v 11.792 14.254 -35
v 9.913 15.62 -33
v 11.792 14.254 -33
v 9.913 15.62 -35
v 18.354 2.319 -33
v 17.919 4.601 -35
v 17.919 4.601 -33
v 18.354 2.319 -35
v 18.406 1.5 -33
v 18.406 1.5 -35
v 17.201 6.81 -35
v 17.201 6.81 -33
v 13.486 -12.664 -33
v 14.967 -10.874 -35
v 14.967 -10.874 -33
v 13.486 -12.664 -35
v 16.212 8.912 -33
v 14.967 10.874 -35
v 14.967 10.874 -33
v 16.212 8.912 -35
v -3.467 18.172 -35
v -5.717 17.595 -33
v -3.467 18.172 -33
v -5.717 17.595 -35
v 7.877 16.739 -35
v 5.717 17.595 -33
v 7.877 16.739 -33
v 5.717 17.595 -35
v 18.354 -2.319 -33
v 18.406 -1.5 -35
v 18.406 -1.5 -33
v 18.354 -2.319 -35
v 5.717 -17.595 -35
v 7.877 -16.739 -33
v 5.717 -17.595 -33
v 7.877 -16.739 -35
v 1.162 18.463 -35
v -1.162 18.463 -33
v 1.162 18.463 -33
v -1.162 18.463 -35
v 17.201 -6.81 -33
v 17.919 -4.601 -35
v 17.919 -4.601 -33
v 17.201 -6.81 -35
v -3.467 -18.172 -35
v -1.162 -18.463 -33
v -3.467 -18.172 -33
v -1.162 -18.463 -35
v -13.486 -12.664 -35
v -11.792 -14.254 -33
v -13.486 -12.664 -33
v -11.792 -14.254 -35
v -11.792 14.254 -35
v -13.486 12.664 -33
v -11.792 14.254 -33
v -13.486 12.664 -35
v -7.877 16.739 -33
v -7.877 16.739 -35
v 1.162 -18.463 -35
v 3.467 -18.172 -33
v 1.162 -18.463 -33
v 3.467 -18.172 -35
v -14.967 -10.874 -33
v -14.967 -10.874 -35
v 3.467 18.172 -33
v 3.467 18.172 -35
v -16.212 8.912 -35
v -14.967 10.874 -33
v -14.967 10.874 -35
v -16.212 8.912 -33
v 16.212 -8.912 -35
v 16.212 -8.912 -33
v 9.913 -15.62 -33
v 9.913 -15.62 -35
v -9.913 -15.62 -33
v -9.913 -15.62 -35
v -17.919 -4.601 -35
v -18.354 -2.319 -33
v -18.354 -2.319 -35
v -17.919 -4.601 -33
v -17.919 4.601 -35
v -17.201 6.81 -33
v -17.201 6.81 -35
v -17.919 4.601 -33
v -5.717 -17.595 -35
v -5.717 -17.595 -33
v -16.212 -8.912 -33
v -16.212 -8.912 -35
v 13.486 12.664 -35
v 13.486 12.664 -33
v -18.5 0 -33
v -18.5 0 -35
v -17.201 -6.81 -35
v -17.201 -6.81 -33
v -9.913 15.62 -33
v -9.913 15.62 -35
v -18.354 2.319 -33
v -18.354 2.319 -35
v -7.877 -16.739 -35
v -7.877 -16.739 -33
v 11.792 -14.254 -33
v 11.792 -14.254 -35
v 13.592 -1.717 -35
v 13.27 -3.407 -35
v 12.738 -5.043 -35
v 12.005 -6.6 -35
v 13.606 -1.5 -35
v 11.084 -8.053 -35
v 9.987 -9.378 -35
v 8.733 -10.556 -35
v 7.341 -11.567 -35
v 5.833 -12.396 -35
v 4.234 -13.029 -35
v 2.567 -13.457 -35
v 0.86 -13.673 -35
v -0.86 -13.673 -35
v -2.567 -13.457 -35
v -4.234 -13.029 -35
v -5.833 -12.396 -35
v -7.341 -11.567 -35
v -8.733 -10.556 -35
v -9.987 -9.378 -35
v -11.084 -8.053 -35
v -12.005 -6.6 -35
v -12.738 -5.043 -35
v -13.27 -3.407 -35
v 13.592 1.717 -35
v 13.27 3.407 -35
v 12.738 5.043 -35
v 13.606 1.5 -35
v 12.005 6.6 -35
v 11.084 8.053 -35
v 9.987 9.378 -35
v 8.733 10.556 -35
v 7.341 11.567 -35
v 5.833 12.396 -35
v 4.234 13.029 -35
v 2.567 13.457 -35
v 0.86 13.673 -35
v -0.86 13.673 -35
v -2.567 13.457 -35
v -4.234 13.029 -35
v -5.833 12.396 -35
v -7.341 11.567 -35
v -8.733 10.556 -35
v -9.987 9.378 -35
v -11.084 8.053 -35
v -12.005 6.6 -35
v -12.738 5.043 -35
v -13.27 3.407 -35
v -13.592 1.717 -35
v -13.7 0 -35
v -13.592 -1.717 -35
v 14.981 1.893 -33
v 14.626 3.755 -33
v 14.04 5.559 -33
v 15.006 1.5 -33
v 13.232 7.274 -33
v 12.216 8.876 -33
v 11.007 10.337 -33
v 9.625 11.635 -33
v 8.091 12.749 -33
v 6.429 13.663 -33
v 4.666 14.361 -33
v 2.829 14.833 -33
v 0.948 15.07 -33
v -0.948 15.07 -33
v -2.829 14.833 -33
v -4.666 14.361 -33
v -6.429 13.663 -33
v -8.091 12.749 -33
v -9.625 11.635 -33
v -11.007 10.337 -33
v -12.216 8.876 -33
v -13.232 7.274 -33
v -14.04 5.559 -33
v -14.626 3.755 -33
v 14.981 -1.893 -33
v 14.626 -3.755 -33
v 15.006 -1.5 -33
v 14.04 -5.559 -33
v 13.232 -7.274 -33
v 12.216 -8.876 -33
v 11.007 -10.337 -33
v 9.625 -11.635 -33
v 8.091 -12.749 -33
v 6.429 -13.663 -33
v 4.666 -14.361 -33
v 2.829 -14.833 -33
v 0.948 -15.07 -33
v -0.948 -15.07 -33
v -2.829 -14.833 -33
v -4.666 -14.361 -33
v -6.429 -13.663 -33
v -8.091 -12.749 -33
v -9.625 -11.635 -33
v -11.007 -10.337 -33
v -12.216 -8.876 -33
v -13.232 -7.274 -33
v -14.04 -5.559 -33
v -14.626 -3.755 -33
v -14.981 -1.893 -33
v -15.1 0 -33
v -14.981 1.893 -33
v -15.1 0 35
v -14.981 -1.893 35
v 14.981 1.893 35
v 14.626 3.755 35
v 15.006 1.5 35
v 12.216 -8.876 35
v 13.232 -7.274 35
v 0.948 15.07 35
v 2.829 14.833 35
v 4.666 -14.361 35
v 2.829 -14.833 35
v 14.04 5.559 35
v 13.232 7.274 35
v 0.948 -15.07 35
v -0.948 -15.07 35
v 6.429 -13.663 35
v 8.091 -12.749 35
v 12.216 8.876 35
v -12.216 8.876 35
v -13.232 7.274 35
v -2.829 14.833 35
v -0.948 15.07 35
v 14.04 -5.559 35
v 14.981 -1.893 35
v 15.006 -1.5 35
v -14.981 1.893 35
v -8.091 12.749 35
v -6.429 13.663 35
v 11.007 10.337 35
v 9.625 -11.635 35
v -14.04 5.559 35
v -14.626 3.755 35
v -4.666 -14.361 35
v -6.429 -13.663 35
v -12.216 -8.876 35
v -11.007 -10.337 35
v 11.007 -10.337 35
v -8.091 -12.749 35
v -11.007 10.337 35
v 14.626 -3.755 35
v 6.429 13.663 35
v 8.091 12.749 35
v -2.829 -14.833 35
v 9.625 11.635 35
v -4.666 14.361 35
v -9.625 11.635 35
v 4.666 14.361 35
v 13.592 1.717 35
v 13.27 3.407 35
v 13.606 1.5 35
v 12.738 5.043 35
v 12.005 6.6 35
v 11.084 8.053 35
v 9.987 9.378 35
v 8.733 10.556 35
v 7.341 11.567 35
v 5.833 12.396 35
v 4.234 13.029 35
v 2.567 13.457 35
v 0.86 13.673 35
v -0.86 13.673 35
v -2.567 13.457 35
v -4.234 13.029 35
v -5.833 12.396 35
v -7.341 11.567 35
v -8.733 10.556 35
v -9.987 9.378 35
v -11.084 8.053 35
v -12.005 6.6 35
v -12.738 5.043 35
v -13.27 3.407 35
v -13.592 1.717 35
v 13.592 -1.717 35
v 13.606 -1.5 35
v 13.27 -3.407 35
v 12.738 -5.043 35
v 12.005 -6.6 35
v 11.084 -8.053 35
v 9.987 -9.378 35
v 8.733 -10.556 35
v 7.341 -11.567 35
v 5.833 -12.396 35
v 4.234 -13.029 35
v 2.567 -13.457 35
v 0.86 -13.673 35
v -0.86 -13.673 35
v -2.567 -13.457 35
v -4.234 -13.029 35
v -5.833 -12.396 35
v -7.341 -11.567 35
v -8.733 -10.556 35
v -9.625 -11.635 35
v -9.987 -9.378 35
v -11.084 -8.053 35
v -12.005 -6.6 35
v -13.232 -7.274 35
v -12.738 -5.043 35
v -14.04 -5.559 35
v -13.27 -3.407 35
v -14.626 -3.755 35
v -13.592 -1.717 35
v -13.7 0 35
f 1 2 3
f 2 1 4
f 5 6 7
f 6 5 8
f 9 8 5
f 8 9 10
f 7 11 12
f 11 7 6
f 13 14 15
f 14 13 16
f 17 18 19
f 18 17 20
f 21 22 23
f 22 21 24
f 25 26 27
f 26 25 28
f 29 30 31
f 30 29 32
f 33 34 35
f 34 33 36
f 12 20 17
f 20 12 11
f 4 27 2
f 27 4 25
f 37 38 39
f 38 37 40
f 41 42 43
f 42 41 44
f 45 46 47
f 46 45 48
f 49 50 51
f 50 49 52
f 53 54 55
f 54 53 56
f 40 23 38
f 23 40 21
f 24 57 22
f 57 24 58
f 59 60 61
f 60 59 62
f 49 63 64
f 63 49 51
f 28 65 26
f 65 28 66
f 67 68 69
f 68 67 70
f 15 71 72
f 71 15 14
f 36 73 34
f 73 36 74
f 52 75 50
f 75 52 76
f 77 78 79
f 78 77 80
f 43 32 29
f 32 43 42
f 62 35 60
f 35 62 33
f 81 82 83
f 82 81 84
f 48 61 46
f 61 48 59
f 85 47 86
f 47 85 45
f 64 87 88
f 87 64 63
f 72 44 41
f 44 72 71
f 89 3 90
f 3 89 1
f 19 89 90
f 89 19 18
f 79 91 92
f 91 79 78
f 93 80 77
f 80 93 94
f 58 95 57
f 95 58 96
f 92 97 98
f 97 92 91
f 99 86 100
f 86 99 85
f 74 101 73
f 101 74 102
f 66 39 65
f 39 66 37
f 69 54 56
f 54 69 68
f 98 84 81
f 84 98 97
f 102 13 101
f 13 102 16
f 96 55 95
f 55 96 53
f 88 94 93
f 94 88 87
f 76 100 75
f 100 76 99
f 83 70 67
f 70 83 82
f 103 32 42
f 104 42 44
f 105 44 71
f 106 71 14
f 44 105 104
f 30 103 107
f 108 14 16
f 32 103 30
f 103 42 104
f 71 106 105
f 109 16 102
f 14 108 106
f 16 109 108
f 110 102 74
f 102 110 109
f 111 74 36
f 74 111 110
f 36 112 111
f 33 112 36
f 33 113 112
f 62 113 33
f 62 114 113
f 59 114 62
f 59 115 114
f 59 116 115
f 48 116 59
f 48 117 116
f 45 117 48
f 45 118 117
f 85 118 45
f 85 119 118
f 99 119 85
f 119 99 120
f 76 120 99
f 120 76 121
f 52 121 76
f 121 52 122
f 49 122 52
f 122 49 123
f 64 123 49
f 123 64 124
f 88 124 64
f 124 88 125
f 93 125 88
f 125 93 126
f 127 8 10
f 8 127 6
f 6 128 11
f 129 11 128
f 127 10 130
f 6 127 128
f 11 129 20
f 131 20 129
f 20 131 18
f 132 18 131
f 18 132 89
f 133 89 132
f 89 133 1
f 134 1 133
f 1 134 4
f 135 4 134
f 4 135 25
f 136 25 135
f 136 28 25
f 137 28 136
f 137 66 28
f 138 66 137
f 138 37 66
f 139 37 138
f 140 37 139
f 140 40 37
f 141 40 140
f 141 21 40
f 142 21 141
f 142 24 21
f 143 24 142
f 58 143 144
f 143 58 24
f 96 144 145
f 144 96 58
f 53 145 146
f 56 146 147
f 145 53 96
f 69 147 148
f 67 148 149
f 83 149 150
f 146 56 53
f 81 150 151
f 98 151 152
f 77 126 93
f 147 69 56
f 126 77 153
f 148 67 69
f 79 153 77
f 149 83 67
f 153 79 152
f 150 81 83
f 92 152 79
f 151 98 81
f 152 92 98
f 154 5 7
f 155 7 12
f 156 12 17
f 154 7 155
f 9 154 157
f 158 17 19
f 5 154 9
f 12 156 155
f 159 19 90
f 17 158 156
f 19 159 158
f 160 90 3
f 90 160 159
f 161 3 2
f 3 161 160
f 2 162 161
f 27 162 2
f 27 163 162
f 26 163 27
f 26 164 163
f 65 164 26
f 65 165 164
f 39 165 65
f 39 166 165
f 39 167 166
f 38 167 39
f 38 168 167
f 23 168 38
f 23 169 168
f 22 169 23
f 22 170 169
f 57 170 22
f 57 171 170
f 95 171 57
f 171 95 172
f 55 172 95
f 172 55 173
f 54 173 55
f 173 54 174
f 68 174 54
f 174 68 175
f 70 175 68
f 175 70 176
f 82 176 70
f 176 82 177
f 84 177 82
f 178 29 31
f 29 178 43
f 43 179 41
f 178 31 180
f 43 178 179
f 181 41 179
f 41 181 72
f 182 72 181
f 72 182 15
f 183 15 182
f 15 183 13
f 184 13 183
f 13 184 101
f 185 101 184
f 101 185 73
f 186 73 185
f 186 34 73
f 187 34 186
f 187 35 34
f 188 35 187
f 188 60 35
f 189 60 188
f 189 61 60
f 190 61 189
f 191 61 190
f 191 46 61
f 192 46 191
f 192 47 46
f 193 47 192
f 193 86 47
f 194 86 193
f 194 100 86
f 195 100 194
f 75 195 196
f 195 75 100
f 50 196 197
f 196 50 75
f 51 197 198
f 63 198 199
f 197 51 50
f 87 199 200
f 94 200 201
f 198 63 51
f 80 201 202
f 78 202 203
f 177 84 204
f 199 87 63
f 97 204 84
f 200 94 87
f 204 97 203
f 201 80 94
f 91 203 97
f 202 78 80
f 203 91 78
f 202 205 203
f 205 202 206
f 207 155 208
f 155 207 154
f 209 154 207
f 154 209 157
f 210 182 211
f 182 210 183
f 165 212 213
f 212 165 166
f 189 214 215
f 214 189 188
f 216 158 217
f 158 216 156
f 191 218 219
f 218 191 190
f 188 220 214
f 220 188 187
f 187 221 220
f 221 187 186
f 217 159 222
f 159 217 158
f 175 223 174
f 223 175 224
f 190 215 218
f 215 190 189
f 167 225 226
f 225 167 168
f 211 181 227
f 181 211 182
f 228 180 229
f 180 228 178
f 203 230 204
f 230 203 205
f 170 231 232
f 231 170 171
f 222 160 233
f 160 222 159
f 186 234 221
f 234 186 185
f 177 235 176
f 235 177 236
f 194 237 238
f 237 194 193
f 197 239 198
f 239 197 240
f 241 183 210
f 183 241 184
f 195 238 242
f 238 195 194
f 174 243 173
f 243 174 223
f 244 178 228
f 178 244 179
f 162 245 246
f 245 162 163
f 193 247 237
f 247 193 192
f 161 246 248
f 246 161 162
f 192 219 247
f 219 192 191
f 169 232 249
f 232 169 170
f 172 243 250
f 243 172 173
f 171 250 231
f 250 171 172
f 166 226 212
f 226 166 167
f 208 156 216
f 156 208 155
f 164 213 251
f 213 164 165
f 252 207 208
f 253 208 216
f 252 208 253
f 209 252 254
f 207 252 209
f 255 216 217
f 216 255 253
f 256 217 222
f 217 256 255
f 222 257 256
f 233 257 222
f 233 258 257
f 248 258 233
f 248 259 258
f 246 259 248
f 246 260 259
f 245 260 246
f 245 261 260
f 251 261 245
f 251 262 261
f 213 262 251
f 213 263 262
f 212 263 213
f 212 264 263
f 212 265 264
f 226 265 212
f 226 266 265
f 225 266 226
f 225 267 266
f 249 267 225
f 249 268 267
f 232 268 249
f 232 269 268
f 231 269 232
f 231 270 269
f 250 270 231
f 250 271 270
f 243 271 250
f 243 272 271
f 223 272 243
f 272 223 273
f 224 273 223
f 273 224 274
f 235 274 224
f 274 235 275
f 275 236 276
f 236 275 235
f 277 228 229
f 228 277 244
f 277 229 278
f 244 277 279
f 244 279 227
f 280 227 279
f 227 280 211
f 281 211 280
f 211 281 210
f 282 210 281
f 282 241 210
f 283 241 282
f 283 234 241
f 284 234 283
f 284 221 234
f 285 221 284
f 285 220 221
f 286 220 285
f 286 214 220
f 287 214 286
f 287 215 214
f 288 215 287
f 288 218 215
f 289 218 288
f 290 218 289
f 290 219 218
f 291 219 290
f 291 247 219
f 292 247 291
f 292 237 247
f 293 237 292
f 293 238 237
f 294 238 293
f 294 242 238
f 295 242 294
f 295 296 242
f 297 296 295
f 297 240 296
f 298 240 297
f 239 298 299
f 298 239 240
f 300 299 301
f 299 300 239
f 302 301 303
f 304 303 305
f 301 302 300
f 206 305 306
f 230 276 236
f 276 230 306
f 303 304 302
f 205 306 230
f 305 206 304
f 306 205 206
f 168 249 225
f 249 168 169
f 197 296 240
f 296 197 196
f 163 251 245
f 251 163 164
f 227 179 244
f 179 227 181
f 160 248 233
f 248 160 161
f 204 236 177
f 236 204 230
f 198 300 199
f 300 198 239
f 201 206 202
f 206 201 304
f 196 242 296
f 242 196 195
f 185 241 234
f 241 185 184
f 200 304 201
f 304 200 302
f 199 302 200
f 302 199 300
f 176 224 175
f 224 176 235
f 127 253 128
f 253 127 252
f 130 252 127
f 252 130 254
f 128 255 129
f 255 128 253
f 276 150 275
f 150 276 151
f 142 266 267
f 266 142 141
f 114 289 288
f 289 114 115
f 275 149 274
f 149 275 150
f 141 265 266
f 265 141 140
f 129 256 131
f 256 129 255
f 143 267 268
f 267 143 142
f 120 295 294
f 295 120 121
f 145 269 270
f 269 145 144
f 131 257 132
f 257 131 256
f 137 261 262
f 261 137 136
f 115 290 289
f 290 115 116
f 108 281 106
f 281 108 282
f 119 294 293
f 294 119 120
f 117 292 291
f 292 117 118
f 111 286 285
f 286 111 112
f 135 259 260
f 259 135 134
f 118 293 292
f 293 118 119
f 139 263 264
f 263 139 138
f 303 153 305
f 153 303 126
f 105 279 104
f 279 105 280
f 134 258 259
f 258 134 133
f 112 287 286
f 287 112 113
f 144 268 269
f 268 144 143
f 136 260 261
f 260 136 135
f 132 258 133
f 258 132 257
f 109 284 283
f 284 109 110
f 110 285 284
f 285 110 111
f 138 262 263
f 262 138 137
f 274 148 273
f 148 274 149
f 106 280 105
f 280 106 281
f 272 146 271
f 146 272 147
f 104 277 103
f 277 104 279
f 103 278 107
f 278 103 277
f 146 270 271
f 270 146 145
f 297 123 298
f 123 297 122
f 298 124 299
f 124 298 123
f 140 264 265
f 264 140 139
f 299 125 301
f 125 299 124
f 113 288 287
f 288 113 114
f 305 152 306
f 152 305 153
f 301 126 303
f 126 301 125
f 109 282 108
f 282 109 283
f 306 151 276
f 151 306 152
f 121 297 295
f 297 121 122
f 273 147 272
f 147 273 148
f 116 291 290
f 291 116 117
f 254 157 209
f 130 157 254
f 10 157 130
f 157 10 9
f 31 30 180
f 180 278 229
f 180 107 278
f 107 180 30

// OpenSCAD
// 298 / 2 = 149
// 286 / 2 = 143
// 272 / 2 = 136
$fn = 50;


// 14.9 - 13.6 = 1.3  

difference(){
    union(){
        translate([0,0, -35]){
            //bottom wide cylinder
            // could be wider ...
            // 17 too narrow
            // try 19 ...
            cylinder(r=18.5, h= 2.0 , center=false);
        }
        // outer cylinder
        // +0.0 too little
        // +0.5 too much
        // +0.2 tight fit
        cylinder(r=14.9 + 0.2, h= 70.0, center=true); 
    }
    
    // inner tube + cutout
    union(){ 
        cylinder(r=13.6 + 0.1, h= 80.1, center=true); // pad for smoothness
        translate([12,0,0]){
            // gap can be bigger, ex. 4
            cube(size=[15,3,81], center=true);
        }   
    }
}

// bottom section
//difference(){
//    cylinder(r=18, h= 1 , center=false);
//    translate([0,0,-1]){
//        cylinder(r=13.65, h= 12, center=false);
//    }
//    translate([12,0,-1]){
//        cube(size=[10,3,100], center=false);
//    }
//}
